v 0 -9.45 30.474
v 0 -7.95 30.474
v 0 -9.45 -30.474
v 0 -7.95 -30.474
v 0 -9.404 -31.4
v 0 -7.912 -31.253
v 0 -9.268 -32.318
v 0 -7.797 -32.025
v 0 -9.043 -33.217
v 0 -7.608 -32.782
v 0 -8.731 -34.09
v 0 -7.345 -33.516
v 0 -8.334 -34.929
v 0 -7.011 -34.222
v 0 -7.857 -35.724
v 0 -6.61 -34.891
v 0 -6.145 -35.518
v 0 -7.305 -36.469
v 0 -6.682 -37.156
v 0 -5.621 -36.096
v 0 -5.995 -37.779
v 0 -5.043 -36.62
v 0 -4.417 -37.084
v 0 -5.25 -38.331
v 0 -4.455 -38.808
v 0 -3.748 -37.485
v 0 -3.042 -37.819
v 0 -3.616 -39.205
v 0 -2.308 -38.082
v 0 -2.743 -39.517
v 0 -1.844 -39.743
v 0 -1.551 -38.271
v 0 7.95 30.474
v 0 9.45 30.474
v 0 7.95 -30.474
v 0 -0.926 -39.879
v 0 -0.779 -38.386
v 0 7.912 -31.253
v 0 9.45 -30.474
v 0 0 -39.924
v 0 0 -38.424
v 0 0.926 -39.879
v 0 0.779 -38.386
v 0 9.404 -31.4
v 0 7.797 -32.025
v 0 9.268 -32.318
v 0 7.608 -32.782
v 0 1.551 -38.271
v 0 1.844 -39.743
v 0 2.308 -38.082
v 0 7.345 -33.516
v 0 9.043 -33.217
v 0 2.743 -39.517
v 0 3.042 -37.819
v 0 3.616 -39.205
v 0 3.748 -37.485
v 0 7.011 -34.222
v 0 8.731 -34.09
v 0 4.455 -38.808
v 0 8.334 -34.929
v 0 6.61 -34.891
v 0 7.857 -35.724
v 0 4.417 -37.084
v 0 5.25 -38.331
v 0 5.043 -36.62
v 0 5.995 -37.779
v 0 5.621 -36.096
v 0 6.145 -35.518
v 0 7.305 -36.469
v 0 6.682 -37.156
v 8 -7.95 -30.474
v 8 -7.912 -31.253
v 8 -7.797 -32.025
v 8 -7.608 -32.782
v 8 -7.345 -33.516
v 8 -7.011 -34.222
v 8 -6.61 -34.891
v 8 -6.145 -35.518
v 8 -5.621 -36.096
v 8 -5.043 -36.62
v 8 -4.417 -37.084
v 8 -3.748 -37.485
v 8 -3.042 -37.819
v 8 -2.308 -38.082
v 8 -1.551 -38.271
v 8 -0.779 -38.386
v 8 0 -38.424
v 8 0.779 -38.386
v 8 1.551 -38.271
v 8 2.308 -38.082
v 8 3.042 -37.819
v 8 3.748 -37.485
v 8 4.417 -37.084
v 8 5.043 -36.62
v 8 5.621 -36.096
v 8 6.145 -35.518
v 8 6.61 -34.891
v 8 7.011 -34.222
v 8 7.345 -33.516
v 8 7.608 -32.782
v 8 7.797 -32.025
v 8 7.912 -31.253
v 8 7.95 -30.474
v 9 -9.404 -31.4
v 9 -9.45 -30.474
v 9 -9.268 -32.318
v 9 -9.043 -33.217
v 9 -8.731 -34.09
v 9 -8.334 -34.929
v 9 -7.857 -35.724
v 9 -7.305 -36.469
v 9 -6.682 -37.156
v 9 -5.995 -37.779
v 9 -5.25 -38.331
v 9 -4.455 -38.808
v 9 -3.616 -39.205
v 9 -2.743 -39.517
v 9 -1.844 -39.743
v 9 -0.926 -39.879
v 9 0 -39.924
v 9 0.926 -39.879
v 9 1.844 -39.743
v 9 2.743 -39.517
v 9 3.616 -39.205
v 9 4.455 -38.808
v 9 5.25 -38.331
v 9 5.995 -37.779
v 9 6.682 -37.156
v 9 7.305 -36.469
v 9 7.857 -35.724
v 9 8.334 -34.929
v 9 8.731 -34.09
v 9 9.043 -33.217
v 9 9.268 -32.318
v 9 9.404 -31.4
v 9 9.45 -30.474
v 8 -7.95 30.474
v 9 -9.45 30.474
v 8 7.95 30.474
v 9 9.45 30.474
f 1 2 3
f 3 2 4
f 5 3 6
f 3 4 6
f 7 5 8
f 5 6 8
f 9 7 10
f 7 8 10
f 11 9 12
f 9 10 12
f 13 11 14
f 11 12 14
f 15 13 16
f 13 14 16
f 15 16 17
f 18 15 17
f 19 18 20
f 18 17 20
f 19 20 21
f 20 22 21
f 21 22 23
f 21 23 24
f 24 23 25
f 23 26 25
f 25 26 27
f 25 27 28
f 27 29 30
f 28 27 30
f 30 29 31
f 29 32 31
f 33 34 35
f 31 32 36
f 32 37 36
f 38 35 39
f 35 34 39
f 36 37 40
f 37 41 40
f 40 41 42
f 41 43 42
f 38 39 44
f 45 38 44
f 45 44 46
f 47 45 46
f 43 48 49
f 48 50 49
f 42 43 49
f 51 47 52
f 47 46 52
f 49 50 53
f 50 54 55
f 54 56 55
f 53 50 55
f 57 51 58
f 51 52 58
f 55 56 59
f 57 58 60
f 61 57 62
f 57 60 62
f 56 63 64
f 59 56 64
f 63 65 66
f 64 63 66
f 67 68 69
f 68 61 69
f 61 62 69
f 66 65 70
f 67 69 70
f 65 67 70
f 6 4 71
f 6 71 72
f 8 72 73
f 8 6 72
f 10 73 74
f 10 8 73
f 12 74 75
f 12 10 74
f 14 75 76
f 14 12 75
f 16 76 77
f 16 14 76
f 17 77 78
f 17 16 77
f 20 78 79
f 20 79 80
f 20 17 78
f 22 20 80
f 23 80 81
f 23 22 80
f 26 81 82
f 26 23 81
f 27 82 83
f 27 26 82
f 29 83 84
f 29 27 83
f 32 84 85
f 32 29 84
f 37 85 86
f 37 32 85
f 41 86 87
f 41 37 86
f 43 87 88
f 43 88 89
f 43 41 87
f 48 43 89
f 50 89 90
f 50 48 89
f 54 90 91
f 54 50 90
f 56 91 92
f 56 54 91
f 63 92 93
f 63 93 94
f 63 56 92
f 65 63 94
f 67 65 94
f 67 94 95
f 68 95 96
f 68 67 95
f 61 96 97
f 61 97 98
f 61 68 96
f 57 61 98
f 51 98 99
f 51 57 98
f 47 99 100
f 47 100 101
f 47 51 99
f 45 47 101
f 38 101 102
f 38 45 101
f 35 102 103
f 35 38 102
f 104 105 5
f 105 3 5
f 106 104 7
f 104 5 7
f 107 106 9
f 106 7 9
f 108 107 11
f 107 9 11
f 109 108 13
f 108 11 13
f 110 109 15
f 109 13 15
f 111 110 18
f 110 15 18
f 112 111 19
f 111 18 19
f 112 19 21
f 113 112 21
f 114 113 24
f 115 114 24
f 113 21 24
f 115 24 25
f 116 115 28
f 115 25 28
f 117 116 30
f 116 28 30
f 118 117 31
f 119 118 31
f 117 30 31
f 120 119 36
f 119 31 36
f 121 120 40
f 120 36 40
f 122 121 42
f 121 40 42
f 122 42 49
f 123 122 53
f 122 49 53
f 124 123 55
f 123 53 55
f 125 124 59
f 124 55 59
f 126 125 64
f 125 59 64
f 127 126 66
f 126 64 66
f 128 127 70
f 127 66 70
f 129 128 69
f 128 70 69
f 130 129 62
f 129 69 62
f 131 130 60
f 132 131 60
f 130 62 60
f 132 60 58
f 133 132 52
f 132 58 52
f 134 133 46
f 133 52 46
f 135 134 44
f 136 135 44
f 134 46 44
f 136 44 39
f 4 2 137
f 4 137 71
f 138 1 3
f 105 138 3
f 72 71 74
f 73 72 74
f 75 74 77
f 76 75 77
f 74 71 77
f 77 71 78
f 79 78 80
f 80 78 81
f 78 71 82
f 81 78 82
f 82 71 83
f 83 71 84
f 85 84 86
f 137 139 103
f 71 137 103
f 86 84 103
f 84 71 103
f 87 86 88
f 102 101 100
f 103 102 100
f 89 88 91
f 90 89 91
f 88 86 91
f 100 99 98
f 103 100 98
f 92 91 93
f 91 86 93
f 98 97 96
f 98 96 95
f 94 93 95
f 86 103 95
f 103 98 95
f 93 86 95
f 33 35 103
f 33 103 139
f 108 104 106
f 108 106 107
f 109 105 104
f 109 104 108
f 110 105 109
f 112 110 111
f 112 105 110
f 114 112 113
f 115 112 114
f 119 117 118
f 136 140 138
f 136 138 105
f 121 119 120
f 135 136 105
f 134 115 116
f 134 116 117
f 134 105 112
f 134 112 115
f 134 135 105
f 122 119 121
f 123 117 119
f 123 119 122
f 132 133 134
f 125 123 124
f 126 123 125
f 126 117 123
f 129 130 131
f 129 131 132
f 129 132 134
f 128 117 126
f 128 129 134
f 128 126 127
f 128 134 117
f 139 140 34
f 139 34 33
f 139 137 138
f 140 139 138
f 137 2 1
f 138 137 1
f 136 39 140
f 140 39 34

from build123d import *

# Parameters (mm, degrees)
EXTRUDE_1_DEPTH          = 8
EXTRUDE_2_DEPTH          = 1
CUT_EXTRUDE_1_DEPTH      = 43.00279577
CUT_EXTRUDE_1_DEPTH_BACK = 43.00279577


with BuildPart() as part:
    # Эскиз1 → Бобышка-Вытянуть1 (new body)
    with BuildSketch(Plane(origin=(0, 0, 0), x_dir=(0, 0, -1), z_dir=(1, 0, 0))):
        with BuildLine():
            Line((-30.474082362, -9.45), (30.474082362, -9.45))
            ThreePointArc((30.474082362, -9.45), (39.924082362, 0), (30.474082362, 9.45))
            Line((30.474082362, 9.45), (-30.474082362, 9.45))
            ThreePointArc((-30.474082362, 9.45), (-39.924082362, 0), (-30.474082362, -9.45))
        make_face()
        with BuildLine():
            Line((-30.474082362, -7.95), (30.474082362, -7.95))
            ThreePointArc((30.474082362, -7.95), (38.424082362, 0), (30.474082362, 7.95))
            Line((30.474082362, 7.95), (-30.474082362, 7.95))
            ThreePointArc((-30.474082362, 7.95), (-38.424082362, 0), (-30.474082362, -7.95))
        make_face(mode=Mode.SUBTRACT)
    extrude(amount=EXTRUDE_1_DEPTH)

    # Эскиз2 → Бобышка-Вытянуть2 (add)
    with BuildSketch(Plane(origin=(8, 0, 0), x_dir=(0, 0, -1), z_dir=(1, 0, 0))):
        with BuildLine():
            Line((-30.474082362, -9.45), (30.474082362, -9.45))
            ThreePointArc((30.474082362, -9.45), (39.924082362, 0), (30.474082362, 9.45))
            Line((30.474082362, 9.45), (-30.474082362, 9.45))
            ThreePointArc((-30.474082362, 9.45), (-39.924082362, 0), (-30.474082362, -9.45))
        make_face()
    extrude(amount=EXTRUDE_2_DEPTH)

    # Эскиз3 → Вырез-Вытянуть1 (cut, two sides: drawn at the far end of the back side and taken through both)
    with BuildSketch(Plane(origin=(9, 0, 0), x_dir=(0, 0, -1), z_dir=(1, 0, 0)).offset(-CUT_EXTRUDE_1_DEPTH_BACK)):
        Polygon((-30.474082362, 9.45), (-30.474082362, -9.45), (-59.348186325, -9.45), (-44.911134344, 15.375653675), align=None)
    extrude(amount=CUT_EXTRUDE_1_DEPTH + CUT_EXTRUDE_1_DEPTH_BACK, mode=Mode.SUBTRACT)


solid = part.part
